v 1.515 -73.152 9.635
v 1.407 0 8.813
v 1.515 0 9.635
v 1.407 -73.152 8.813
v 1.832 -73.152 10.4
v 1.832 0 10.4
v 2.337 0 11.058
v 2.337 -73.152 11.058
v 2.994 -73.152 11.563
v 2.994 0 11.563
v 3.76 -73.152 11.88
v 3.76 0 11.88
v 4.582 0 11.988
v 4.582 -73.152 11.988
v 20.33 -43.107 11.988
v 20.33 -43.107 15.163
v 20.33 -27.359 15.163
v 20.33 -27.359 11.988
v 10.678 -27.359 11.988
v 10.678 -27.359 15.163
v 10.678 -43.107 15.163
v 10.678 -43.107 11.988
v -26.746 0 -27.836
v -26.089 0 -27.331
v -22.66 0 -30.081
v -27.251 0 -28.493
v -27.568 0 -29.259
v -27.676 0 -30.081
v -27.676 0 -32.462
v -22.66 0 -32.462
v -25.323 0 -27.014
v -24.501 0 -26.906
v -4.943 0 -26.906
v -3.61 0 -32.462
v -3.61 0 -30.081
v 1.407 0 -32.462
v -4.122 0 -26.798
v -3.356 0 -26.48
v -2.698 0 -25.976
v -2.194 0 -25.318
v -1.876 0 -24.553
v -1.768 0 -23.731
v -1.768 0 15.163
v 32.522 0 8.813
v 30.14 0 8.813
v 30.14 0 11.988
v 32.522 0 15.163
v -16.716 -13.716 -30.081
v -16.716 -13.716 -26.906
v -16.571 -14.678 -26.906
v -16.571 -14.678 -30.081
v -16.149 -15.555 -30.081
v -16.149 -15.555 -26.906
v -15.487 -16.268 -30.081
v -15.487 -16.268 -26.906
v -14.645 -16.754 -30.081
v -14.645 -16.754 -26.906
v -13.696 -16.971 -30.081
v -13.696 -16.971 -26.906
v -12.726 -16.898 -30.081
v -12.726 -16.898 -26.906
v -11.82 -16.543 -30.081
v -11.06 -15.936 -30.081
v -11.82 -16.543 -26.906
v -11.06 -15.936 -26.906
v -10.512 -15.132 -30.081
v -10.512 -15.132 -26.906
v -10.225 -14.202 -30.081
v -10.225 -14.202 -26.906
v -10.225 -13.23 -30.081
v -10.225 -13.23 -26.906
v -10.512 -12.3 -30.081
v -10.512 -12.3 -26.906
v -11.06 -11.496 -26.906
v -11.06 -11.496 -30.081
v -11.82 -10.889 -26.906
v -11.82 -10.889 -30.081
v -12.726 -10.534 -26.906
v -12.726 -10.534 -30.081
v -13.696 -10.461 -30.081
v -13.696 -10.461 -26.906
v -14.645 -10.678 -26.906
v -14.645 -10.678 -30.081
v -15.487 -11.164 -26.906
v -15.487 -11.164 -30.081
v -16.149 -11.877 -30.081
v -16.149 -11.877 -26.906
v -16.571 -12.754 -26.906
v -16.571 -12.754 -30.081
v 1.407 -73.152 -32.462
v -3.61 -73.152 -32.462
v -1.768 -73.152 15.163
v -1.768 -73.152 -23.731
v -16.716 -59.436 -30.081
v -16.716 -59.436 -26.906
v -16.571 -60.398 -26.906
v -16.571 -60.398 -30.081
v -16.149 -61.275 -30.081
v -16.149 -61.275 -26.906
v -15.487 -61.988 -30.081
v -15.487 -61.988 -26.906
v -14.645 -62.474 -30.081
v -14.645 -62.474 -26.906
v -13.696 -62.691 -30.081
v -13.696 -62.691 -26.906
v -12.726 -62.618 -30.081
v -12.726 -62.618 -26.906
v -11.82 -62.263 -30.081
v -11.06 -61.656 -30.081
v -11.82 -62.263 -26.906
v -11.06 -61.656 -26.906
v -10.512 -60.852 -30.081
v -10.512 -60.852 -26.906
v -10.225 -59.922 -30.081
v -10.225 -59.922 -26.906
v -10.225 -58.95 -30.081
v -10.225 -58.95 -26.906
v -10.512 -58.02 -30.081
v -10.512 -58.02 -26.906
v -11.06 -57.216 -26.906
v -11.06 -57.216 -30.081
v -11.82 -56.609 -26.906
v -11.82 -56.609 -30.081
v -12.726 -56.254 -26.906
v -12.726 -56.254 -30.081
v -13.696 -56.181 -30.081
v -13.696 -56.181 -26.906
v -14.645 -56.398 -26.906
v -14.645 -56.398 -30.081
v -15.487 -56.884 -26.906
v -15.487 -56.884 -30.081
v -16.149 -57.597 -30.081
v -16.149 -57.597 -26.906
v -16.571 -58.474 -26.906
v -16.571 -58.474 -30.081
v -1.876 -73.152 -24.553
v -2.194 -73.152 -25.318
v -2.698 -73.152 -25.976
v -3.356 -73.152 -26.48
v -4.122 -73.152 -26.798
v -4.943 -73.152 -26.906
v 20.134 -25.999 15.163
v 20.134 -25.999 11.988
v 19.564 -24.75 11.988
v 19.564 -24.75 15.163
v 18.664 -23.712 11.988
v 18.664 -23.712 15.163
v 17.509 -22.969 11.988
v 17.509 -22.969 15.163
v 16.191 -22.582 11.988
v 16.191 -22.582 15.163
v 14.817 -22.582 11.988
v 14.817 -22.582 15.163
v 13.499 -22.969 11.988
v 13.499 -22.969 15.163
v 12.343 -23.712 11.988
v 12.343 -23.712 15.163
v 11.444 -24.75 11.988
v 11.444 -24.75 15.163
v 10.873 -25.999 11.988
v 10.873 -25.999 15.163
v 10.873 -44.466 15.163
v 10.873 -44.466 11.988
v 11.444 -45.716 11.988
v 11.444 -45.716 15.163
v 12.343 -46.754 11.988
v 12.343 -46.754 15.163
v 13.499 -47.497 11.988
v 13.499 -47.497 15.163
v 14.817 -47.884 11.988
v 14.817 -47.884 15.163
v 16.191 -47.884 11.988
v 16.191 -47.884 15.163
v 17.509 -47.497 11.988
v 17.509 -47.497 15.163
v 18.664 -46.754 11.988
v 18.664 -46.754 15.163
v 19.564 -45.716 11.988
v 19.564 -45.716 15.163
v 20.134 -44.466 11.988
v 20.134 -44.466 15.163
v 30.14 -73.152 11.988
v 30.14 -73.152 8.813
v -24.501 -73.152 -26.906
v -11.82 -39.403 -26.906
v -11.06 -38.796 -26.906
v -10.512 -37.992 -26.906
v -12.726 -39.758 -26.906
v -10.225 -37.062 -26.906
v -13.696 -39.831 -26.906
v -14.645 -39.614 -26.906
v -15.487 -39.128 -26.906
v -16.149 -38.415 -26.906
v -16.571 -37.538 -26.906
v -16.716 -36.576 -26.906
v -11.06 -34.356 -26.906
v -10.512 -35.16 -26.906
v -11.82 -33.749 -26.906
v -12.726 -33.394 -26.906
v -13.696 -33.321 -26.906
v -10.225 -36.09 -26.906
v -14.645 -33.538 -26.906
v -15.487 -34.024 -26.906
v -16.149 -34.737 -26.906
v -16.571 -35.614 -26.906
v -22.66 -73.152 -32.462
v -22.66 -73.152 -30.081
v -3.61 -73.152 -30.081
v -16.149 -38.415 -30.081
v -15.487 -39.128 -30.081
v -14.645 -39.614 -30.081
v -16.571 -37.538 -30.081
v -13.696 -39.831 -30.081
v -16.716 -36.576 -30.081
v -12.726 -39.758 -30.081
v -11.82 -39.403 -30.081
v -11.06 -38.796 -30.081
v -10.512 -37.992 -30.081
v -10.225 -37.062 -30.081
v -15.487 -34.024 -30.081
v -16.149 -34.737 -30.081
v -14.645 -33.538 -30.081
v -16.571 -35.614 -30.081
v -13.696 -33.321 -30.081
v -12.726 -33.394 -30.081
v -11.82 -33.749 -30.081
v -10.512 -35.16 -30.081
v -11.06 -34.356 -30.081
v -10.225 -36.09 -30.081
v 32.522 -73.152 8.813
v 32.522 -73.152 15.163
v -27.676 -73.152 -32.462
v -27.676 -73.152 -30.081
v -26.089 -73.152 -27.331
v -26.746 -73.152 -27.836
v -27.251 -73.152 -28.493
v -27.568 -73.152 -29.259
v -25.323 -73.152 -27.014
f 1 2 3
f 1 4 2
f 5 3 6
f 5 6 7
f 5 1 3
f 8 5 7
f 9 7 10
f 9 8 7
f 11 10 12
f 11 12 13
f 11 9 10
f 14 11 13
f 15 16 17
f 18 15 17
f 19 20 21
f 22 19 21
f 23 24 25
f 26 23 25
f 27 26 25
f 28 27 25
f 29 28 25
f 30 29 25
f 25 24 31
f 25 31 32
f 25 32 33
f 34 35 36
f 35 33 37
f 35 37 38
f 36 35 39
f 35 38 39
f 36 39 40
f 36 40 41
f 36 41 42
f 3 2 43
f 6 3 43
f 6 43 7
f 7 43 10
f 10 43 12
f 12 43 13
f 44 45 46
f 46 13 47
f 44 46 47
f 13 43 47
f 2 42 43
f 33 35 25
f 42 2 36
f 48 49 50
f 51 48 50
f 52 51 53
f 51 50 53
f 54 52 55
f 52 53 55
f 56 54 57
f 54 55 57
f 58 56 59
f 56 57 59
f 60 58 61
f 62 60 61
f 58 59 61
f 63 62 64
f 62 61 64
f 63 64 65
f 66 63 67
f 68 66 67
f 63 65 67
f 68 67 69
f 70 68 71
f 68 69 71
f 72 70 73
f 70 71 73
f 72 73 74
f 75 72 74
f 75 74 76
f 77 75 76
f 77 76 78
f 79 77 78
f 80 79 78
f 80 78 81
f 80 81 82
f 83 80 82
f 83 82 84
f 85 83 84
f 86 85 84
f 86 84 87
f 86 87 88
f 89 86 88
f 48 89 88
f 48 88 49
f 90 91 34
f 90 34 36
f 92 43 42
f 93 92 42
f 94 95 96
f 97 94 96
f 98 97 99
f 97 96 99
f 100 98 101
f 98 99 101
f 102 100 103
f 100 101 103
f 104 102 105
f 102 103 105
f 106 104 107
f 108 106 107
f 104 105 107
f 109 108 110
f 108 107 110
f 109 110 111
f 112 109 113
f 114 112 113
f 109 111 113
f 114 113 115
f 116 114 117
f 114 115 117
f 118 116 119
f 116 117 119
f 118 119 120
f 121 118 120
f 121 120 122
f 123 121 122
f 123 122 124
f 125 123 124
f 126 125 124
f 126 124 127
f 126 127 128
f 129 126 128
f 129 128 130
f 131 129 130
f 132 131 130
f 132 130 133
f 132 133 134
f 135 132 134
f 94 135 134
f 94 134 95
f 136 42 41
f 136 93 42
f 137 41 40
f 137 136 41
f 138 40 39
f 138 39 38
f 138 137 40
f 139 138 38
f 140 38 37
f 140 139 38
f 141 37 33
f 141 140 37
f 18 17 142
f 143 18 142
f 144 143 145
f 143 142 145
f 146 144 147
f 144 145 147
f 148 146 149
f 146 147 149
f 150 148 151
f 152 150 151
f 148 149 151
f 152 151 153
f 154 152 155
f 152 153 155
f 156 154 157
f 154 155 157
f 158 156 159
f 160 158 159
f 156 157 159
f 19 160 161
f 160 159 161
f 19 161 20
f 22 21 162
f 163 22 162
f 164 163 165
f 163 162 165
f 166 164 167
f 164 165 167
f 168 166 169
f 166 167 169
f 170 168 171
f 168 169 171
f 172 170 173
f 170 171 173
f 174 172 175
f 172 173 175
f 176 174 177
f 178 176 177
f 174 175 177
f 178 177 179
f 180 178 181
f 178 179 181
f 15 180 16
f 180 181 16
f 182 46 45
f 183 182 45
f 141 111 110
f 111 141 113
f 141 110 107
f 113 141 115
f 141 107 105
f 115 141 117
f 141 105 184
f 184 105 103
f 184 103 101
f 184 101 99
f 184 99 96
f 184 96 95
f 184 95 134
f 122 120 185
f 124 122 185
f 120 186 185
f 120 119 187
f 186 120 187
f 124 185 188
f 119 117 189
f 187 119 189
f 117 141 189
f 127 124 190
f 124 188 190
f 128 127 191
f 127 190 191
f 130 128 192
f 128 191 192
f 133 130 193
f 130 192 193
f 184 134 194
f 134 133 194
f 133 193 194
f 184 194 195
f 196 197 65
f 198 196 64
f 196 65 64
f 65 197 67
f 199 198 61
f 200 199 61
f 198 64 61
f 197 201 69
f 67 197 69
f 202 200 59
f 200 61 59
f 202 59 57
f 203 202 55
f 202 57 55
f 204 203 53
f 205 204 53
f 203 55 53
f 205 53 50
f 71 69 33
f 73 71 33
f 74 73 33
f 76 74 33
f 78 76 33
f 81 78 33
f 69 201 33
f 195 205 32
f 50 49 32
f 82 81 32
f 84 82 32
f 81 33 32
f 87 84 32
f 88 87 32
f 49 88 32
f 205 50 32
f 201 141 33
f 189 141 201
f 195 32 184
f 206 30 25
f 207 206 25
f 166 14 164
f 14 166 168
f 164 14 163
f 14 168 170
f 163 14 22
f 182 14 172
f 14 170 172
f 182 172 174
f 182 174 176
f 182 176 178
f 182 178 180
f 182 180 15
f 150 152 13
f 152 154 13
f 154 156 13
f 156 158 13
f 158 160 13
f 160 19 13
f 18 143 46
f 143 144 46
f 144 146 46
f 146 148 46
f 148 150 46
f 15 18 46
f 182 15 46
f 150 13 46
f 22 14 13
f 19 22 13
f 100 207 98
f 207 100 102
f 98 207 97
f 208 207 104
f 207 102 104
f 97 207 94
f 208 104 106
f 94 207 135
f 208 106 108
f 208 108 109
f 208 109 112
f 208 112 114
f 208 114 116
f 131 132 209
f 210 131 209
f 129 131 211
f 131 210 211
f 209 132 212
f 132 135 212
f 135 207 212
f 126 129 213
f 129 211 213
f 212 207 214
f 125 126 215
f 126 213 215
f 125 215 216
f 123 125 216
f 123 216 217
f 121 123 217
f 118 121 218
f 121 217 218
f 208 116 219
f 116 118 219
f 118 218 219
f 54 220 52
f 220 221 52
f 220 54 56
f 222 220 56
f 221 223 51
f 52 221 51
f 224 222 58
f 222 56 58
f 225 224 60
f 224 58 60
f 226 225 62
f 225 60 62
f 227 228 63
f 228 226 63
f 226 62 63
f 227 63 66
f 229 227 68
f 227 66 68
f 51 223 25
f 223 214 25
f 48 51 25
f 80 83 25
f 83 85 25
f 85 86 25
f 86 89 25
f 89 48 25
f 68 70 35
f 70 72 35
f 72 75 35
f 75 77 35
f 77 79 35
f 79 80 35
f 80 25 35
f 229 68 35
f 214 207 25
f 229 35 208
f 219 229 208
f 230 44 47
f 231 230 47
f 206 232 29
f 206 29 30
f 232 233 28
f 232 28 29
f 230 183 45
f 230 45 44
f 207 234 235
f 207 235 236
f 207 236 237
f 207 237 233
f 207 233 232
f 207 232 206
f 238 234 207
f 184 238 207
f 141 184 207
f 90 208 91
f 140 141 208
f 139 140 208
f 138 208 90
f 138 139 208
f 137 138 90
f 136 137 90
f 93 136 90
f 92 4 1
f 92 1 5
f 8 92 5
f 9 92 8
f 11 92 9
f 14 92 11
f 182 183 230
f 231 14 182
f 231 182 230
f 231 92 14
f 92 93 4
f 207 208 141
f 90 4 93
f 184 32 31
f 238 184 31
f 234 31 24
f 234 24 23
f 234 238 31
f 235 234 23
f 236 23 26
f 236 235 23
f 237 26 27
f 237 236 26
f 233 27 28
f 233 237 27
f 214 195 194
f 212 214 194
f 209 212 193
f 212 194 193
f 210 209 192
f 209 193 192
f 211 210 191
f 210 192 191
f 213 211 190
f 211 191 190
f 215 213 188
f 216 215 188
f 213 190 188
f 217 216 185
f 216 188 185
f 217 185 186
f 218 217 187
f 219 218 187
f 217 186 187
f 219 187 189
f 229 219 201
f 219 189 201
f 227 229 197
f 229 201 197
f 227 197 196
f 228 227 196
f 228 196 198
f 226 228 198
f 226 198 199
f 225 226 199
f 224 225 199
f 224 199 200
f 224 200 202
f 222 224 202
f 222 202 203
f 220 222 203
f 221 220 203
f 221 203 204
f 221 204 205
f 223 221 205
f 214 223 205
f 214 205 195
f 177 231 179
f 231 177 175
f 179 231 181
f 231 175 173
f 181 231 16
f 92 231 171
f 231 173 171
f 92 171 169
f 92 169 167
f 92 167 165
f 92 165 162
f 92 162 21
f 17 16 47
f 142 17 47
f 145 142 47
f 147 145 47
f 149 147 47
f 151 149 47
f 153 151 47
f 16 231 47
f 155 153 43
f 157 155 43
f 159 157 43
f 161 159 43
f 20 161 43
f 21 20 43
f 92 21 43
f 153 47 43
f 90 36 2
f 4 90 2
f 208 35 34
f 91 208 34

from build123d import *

# Parameters (mm, degrees)
F1_DEPTH = 73.152
F3_D     = 6.5278
F5_DEPTH = 47.626
F6_R     = 3.175


with BuildPart() as f1:
    # F0 (on Front) → F1 (new body)
    with BuildSketch(Plane.XZ):
        Polygon((32.5217237333, 11.9879317781), (32.5217237333, 15.1629317781), (-1.7682762667, 15.1629317781), (-1.7682762667, -26.9058182219), (-27.6762762667, -26.9058182219), (-27.6762762667, -32.4620682219), (-22.6597762667, -32.4620682219), (-22.6597762667, -30.0808182219), (-3.6097762667, -30.0808182219), (-3.6097762667, -32.4620682219), (1.4067237333, -32.4620682219), (1.4067237333, 11.9879317781), (30.1404737333, 11.9879317781), (30.1404737333, 8.8129317781), (32.5217237333, 8.8129317781), align=None)
    extrude(amount=F1_DEPTH)

    # F3 (through all)
    with Locations(Plane(origin=(0, 0, -30.0808182219), x_dir=(1, 0, 0), z_dir=(0, 0, -1))):
        with Locations((-13.4522762667, 13.716), (-13.4522762667, 36.576), (-13.4522762667, 59.436)):
            Hole(F3_D / 2)

    # F4 (on face) → F5 (cut, through all)
    with BuildSketch(Plane.XY.offset(15.1629317781)):
        with BuildLine():
            ThreePointArc((20.3297237333, -27.3588467389), (15.5037237333, -22.5328467389), (10.6777237333, -27.3588467389))
            Line((10.6777237333, -27.3588467389), (10.6777237333, -43.1068467389))
            ThreePointArc((10.6777237333, -43.1068467389), (15.5037237333, -47.9328467389), (20.3297237333, -43.1068467389))
            Line((20.3297237333, -43.1068467389), (20.3297237333, -27.3588467389))
        make_face()
    extrude(amount=-F5_DEPTH, mode=Mode.SUBTRACT)

    # F6
    f6_edges = [f1.edges().sort_by_distance(p)[0] for p in [
        (-1.768276, -36.576, -26.905818),
        (1.406724, -36.576, 11.987932),
        (-27.676276, -36.576, -26.905818),
    ]]
    fillet(f6_edges, radius=F6_R)


solid = f1.part
